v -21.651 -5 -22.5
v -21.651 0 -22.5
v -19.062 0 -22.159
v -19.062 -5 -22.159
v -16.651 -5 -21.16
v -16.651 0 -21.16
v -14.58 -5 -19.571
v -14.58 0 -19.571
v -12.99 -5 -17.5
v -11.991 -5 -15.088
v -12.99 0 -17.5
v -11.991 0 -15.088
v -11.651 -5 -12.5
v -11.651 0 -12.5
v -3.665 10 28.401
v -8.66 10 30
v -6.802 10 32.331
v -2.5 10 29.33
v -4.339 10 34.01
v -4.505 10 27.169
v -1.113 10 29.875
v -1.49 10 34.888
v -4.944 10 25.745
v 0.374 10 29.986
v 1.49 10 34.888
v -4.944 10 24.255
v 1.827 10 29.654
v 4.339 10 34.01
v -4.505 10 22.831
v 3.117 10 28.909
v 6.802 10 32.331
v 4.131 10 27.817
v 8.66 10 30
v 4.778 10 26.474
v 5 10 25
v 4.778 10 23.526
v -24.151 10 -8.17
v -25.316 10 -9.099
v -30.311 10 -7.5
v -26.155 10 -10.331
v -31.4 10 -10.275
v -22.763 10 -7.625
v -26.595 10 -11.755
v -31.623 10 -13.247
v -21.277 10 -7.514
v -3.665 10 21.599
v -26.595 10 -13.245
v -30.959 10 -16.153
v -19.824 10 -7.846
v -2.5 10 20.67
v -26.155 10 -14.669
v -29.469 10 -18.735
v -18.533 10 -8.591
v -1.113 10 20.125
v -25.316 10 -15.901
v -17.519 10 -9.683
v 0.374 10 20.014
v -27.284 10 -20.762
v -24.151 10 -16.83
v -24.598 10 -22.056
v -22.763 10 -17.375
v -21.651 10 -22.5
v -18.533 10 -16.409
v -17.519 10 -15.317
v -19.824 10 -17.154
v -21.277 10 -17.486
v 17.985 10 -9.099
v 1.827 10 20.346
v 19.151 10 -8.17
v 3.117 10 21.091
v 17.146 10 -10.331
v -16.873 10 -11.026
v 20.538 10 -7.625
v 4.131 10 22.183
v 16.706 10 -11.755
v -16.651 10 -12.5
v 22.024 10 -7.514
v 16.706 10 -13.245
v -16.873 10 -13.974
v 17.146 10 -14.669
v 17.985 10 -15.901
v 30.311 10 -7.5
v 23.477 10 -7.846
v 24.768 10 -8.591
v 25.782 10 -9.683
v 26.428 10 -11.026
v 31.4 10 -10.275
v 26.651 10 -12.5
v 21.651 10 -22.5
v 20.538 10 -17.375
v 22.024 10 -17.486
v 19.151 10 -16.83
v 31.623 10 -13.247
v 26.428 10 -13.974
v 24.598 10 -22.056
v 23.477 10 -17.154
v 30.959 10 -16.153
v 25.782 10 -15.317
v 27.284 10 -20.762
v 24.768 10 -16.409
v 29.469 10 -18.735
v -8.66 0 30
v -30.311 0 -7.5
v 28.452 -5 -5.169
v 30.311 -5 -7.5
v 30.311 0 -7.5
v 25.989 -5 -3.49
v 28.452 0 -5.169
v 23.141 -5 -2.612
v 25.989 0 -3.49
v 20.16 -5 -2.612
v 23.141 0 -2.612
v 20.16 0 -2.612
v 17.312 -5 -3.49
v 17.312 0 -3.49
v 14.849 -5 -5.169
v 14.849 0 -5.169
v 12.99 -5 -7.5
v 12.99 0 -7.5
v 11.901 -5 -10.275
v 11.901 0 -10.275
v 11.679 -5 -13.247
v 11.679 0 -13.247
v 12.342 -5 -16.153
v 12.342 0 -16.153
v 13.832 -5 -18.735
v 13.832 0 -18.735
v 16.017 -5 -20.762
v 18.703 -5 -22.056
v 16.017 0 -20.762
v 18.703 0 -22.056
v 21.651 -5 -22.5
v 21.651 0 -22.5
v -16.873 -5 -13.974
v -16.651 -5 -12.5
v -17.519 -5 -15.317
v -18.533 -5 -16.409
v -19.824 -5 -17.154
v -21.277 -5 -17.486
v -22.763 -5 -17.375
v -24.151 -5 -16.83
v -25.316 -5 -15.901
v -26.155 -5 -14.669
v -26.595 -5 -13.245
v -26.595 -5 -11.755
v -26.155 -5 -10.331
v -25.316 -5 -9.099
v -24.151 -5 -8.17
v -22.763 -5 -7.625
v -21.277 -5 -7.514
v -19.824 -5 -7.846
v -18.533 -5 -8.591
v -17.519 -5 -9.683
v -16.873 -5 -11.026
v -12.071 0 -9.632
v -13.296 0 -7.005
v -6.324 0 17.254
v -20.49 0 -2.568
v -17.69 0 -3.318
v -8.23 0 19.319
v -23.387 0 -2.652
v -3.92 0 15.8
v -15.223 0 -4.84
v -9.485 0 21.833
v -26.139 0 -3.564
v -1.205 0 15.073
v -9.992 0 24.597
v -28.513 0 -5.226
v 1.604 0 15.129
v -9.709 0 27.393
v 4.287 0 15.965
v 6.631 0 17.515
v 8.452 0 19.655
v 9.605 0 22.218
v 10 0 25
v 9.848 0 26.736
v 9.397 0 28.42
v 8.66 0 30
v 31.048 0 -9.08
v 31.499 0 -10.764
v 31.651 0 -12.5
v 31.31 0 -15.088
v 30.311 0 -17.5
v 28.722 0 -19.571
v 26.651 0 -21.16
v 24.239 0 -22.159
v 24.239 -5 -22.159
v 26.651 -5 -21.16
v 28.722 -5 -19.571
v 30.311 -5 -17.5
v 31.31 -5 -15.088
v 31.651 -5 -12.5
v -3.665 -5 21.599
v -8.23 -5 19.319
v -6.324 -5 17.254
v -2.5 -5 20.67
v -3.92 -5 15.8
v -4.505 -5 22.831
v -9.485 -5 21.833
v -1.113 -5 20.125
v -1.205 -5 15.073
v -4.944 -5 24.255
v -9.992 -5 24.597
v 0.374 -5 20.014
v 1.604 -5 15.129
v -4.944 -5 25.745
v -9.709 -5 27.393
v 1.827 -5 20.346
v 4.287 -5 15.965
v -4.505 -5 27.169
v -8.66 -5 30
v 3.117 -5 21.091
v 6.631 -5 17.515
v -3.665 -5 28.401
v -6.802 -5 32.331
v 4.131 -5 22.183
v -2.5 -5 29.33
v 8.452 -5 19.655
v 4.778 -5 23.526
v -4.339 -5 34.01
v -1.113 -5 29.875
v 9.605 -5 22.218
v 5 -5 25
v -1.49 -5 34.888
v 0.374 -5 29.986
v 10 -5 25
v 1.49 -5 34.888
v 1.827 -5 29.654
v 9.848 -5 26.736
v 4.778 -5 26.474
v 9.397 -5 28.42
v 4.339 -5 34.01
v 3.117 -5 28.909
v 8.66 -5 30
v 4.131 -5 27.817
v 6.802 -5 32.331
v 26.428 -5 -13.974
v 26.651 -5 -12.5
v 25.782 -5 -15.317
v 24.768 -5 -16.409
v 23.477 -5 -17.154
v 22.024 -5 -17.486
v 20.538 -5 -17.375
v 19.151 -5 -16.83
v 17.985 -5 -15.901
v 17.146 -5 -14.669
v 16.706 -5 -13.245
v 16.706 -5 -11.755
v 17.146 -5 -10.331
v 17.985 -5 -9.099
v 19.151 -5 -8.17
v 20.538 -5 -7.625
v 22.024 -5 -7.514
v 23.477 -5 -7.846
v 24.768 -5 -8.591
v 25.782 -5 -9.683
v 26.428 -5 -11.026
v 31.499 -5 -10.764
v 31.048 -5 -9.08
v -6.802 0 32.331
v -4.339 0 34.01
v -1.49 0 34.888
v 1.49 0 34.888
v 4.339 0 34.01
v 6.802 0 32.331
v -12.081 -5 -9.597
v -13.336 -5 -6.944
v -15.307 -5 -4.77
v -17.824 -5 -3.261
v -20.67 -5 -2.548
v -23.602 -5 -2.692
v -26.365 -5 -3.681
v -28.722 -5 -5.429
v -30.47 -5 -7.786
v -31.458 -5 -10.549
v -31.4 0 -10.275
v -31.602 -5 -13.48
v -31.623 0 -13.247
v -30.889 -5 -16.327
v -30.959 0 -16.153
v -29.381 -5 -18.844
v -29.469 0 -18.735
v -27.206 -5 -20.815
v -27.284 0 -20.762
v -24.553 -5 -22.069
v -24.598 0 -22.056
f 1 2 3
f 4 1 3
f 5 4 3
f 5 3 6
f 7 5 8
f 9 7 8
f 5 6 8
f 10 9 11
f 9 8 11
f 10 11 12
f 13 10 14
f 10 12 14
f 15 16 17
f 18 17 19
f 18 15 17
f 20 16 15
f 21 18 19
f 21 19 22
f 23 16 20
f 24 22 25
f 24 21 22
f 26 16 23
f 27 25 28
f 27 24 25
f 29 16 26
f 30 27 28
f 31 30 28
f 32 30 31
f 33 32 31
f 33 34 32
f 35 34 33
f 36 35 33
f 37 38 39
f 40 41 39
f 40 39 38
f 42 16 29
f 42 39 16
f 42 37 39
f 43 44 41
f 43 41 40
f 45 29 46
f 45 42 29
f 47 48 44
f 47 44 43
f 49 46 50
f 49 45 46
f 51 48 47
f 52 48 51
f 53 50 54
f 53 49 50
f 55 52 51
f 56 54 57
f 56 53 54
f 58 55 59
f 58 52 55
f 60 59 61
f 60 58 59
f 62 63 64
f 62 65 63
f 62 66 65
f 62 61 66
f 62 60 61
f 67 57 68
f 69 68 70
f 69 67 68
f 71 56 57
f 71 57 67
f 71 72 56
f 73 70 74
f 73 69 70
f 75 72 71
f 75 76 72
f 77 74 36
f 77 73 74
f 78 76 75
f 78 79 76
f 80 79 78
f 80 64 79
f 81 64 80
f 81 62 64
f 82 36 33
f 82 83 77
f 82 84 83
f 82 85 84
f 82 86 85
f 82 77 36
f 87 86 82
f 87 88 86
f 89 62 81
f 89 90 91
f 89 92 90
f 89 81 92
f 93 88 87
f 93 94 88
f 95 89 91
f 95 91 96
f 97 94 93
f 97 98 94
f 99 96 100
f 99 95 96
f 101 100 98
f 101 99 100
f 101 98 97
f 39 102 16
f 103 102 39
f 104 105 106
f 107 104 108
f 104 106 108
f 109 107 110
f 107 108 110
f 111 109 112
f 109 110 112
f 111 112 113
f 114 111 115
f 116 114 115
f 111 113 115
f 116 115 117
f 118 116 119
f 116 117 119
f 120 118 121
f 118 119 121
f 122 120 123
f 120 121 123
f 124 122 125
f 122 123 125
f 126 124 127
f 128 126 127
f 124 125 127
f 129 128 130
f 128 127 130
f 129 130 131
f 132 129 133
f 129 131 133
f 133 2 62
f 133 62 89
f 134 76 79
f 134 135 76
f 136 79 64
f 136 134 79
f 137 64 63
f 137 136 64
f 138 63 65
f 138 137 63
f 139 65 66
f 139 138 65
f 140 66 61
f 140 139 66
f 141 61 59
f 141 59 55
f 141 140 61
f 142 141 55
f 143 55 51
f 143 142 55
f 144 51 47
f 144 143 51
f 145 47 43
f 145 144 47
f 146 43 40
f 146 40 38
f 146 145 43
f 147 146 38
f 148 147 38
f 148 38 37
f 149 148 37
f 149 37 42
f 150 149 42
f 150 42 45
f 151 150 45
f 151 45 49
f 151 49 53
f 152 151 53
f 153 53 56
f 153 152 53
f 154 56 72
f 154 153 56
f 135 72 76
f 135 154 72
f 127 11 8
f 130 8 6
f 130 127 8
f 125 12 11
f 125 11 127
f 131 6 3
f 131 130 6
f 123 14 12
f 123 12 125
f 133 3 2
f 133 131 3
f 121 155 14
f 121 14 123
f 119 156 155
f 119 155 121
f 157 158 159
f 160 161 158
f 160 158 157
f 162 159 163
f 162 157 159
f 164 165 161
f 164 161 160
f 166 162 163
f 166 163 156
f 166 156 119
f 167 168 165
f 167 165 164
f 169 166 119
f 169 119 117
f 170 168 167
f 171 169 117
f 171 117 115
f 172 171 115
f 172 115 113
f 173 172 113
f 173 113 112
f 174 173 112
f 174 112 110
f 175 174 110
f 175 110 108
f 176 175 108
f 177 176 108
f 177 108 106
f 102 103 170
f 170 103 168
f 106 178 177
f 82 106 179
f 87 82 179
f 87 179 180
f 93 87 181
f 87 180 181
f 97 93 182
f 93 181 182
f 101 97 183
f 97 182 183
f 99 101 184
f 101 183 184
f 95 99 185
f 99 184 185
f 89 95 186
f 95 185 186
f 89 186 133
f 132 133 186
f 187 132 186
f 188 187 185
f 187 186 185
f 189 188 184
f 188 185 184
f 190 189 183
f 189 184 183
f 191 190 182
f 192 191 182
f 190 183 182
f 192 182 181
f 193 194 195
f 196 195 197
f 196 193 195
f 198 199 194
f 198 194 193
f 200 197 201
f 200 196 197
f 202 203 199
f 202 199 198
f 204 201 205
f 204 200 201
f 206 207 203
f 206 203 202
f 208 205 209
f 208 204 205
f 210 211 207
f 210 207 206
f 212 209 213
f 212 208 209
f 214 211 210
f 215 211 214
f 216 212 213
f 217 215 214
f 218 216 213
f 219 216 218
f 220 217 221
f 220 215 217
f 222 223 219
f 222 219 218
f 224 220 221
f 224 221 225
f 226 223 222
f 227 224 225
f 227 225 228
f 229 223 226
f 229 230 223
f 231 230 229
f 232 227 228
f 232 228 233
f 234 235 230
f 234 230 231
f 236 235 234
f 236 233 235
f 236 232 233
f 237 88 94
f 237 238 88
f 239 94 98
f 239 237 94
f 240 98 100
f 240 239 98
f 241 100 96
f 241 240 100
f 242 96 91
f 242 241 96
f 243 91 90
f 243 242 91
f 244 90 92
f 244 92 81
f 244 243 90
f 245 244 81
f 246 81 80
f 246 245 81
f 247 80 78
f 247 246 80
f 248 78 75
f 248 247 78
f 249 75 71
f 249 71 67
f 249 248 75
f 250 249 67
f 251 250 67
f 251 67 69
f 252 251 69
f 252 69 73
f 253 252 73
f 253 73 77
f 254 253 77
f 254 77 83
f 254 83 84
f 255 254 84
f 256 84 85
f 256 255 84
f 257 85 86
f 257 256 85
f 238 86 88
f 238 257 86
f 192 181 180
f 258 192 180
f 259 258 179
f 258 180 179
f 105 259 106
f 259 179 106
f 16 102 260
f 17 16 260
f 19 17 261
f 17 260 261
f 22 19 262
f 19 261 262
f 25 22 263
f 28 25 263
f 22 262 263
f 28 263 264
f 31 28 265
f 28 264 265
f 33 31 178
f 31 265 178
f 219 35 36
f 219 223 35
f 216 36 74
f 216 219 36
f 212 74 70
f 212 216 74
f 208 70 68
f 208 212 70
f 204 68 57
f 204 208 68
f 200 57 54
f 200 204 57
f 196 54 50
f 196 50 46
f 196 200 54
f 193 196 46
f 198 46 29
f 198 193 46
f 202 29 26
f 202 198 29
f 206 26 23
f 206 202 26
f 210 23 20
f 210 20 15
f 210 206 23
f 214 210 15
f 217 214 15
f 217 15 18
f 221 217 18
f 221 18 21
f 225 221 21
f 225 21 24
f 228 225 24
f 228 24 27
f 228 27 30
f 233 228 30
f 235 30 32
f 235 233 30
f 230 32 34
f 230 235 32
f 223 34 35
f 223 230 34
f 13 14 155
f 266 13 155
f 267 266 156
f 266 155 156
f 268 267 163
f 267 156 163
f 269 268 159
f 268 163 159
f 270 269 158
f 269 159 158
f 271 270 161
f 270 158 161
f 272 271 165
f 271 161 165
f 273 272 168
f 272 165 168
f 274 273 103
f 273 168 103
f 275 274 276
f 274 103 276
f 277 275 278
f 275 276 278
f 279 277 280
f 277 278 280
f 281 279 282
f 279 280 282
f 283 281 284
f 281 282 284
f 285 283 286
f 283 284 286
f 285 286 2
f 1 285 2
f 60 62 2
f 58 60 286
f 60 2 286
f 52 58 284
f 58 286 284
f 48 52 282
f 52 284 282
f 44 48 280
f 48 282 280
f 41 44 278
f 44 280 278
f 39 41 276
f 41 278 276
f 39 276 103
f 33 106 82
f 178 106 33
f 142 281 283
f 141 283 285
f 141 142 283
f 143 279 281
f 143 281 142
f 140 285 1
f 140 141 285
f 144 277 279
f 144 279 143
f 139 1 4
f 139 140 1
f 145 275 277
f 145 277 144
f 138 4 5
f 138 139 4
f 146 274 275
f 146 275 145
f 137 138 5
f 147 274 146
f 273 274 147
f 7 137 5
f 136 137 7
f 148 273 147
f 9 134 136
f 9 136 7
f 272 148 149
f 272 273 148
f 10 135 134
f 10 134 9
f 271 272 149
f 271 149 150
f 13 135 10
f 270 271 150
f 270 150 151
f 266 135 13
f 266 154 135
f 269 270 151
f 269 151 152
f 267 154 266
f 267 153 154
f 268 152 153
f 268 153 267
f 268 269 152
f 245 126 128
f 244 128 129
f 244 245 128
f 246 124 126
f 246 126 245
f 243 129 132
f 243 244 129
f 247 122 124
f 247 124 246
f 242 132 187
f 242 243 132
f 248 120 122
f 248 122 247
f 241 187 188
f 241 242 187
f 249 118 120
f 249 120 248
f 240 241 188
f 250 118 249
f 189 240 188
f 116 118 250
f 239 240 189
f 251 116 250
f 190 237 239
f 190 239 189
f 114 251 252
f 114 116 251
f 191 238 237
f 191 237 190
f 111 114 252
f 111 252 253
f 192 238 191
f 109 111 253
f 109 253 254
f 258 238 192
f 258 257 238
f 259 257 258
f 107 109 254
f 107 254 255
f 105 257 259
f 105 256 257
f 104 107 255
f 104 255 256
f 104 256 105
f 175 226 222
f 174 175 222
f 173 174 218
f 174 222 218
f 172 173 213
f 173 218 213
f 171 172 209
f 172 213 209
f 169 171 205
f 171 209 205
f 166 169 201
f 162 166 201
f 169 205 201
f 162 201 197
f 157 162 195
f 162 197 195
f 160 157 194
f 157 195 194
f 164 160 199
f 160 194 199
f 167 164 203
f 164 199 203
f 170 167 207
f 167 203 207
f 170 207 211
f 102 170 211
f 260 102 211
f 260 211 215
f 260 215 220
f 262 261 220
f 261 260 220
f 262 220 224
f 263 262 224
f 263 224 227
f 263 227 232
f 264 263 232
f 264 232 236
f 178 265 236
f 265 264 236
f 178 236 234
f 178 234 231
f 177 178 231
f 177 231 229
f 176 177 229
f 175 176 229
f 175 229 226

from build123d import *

# Parameters (mm, degrees)
F1_DEPTH  = 10
F0_R      = 5
F2_DEPTH  = 5
F2_FACE_R = 5
F3_DEPTH  = 10


with BuildPart() as f1:
    # F0 (on Front) → F1 (new body)
    with BuildSketch(Plane.XZ):
        with BuildLine():
            ThreePointArc((8.6602540378, 30), (9.6592582629, 27.588190451), (10, 25))
            ThreePointArc((10, 25), (-2.588190451, 15.3407417371), (-8.6602540378, 30))
            Line((-8.6602540378, 30), (-30.3108891325, -7.5))
            ThreePointArc((-30.3108891325, -7.5), (-19.0624446436, -2.8407417371), (-11.6506350946, -12.5))
            ThreePointArc((-11.6506350946, -12.5), (-14.5795672827, -19.5710678119), (-21.6506350946, -22.5))
            Line((-21.6506350946, -22.5), (21.6506350946, -22.5))
            ThreePointArc((21.6506350946, -22.5), (12.9903810568, -7.5), (30.3108891325, -7.5))
            Line((30.3108891325, -7.5), (8.6602540378, 30))
        make_face()
    extrude(amount=-F1_DEPTH)

    # F0 (on Front) → F2 (join)
    with BuildSketch(Plane.XZ):
        with BuildLine():
            ThreePointArc((-8.6602540378, 30), (-2.588190451, 15.3407417371), (10, 25))
            ThreePointArc((10, 25), (9.6592582629, 27.588190451), (8.6602540378, 30))
            ThreePointArc((8.6602540378, 30), (0, 35), (-8.6602540378, 30))
        make_face()
        with Locations((0, 25)):
            Circle(F0_R, mode=Mode.SUBTRACT)
        with BuildLine():
            ThreePointArc((-11.6506350946, -12.5), (-19.0624446436, -2.8407417371), (-30.3108891325, -7.5))
            ThreePointArc((-30.3108891325, -7.5), (-30.3108891325, -17.5), (-21.6506350946, -22.5))
            ThreePointArc((-21.6506350946, -22.5), (-14.5795672827, -19.5710678119), (-11.6506350946, -12.5))
        make_face()
        with Locations((-21.6506350946, -12.5)):
            Circle(F0_R, mode=Mode.SUBTRACT)
        with BuildLine():
            ThreePointArc((31.6506350946, -12.5), (31.3098933575, -9.911809549), (30.3108891325, -7.5))
            ThreePointArc((30.3108891325, -7.5), (12.9903810568, -7.5), (21.6506350946, -22.5))
            ThreePointArc((21.6506350946, -22.5), (28.7217029065, -19.5710678119), (31.6506350946, -12.5))
        make_face()
        with Locations((21.6506350946, -12.5)):
            Circle(F0_R, mode=Mode.SUBTRACT)
    extrude(amount=F2_DEPTH)

    # F2_face (on face) → F3 (join)
    with BuildSketch(Plane(origin=(0, 0, 25), x_dir=(1, 0, 0), z_dir=(0, 1, 0))):
        with BuildLine():
            ThreePointArc((8.6602540378, -5), (9.6592582629, -2.588190451), (10, 0))
            ThreePointArc((10, 0), (-2.588190451, 9.6592582629), (-8.6602540378, -5))
            ThreePointArc((-8.6602540378, -5), (0, -10), (8.6602540378, -5))
        make_face()
        Circle(F2_FACE_R, mode=Mode.SUBTRACT)
        with BuildLine():
            ThreePointArc((21.6506350946, 47.5), (12.9903810568, 32.5), (30.3108891325, 32.5))
            ThreePointArc((30.3108891325, 32.5), (30.3108891325, 42.5), (21.6506350946, 47.5))
        make_face()
        with Locations((21.6506350946, 37.5)):
            Circle(F2_FACE_R, mode=Mode.SUBTRACT)
        with BuildLine():
            ThreePointArc((-21.6506350946, 47.5), (-30.3108891325, 42.5), (-30.3108891325, 32.5))
            ThreePointArc((-30.3108891325, 32.5), (-12.9903810568, 32.5), (-21.6506350946, 47.5))
        make_face()
        with Locations((-21.6506350946, 37.5)):
            Circle(F2_FACE_R, mode=Mode.SUBTRACT)
    extrude(amount=F3_DEPTH)


solid = f1.part
